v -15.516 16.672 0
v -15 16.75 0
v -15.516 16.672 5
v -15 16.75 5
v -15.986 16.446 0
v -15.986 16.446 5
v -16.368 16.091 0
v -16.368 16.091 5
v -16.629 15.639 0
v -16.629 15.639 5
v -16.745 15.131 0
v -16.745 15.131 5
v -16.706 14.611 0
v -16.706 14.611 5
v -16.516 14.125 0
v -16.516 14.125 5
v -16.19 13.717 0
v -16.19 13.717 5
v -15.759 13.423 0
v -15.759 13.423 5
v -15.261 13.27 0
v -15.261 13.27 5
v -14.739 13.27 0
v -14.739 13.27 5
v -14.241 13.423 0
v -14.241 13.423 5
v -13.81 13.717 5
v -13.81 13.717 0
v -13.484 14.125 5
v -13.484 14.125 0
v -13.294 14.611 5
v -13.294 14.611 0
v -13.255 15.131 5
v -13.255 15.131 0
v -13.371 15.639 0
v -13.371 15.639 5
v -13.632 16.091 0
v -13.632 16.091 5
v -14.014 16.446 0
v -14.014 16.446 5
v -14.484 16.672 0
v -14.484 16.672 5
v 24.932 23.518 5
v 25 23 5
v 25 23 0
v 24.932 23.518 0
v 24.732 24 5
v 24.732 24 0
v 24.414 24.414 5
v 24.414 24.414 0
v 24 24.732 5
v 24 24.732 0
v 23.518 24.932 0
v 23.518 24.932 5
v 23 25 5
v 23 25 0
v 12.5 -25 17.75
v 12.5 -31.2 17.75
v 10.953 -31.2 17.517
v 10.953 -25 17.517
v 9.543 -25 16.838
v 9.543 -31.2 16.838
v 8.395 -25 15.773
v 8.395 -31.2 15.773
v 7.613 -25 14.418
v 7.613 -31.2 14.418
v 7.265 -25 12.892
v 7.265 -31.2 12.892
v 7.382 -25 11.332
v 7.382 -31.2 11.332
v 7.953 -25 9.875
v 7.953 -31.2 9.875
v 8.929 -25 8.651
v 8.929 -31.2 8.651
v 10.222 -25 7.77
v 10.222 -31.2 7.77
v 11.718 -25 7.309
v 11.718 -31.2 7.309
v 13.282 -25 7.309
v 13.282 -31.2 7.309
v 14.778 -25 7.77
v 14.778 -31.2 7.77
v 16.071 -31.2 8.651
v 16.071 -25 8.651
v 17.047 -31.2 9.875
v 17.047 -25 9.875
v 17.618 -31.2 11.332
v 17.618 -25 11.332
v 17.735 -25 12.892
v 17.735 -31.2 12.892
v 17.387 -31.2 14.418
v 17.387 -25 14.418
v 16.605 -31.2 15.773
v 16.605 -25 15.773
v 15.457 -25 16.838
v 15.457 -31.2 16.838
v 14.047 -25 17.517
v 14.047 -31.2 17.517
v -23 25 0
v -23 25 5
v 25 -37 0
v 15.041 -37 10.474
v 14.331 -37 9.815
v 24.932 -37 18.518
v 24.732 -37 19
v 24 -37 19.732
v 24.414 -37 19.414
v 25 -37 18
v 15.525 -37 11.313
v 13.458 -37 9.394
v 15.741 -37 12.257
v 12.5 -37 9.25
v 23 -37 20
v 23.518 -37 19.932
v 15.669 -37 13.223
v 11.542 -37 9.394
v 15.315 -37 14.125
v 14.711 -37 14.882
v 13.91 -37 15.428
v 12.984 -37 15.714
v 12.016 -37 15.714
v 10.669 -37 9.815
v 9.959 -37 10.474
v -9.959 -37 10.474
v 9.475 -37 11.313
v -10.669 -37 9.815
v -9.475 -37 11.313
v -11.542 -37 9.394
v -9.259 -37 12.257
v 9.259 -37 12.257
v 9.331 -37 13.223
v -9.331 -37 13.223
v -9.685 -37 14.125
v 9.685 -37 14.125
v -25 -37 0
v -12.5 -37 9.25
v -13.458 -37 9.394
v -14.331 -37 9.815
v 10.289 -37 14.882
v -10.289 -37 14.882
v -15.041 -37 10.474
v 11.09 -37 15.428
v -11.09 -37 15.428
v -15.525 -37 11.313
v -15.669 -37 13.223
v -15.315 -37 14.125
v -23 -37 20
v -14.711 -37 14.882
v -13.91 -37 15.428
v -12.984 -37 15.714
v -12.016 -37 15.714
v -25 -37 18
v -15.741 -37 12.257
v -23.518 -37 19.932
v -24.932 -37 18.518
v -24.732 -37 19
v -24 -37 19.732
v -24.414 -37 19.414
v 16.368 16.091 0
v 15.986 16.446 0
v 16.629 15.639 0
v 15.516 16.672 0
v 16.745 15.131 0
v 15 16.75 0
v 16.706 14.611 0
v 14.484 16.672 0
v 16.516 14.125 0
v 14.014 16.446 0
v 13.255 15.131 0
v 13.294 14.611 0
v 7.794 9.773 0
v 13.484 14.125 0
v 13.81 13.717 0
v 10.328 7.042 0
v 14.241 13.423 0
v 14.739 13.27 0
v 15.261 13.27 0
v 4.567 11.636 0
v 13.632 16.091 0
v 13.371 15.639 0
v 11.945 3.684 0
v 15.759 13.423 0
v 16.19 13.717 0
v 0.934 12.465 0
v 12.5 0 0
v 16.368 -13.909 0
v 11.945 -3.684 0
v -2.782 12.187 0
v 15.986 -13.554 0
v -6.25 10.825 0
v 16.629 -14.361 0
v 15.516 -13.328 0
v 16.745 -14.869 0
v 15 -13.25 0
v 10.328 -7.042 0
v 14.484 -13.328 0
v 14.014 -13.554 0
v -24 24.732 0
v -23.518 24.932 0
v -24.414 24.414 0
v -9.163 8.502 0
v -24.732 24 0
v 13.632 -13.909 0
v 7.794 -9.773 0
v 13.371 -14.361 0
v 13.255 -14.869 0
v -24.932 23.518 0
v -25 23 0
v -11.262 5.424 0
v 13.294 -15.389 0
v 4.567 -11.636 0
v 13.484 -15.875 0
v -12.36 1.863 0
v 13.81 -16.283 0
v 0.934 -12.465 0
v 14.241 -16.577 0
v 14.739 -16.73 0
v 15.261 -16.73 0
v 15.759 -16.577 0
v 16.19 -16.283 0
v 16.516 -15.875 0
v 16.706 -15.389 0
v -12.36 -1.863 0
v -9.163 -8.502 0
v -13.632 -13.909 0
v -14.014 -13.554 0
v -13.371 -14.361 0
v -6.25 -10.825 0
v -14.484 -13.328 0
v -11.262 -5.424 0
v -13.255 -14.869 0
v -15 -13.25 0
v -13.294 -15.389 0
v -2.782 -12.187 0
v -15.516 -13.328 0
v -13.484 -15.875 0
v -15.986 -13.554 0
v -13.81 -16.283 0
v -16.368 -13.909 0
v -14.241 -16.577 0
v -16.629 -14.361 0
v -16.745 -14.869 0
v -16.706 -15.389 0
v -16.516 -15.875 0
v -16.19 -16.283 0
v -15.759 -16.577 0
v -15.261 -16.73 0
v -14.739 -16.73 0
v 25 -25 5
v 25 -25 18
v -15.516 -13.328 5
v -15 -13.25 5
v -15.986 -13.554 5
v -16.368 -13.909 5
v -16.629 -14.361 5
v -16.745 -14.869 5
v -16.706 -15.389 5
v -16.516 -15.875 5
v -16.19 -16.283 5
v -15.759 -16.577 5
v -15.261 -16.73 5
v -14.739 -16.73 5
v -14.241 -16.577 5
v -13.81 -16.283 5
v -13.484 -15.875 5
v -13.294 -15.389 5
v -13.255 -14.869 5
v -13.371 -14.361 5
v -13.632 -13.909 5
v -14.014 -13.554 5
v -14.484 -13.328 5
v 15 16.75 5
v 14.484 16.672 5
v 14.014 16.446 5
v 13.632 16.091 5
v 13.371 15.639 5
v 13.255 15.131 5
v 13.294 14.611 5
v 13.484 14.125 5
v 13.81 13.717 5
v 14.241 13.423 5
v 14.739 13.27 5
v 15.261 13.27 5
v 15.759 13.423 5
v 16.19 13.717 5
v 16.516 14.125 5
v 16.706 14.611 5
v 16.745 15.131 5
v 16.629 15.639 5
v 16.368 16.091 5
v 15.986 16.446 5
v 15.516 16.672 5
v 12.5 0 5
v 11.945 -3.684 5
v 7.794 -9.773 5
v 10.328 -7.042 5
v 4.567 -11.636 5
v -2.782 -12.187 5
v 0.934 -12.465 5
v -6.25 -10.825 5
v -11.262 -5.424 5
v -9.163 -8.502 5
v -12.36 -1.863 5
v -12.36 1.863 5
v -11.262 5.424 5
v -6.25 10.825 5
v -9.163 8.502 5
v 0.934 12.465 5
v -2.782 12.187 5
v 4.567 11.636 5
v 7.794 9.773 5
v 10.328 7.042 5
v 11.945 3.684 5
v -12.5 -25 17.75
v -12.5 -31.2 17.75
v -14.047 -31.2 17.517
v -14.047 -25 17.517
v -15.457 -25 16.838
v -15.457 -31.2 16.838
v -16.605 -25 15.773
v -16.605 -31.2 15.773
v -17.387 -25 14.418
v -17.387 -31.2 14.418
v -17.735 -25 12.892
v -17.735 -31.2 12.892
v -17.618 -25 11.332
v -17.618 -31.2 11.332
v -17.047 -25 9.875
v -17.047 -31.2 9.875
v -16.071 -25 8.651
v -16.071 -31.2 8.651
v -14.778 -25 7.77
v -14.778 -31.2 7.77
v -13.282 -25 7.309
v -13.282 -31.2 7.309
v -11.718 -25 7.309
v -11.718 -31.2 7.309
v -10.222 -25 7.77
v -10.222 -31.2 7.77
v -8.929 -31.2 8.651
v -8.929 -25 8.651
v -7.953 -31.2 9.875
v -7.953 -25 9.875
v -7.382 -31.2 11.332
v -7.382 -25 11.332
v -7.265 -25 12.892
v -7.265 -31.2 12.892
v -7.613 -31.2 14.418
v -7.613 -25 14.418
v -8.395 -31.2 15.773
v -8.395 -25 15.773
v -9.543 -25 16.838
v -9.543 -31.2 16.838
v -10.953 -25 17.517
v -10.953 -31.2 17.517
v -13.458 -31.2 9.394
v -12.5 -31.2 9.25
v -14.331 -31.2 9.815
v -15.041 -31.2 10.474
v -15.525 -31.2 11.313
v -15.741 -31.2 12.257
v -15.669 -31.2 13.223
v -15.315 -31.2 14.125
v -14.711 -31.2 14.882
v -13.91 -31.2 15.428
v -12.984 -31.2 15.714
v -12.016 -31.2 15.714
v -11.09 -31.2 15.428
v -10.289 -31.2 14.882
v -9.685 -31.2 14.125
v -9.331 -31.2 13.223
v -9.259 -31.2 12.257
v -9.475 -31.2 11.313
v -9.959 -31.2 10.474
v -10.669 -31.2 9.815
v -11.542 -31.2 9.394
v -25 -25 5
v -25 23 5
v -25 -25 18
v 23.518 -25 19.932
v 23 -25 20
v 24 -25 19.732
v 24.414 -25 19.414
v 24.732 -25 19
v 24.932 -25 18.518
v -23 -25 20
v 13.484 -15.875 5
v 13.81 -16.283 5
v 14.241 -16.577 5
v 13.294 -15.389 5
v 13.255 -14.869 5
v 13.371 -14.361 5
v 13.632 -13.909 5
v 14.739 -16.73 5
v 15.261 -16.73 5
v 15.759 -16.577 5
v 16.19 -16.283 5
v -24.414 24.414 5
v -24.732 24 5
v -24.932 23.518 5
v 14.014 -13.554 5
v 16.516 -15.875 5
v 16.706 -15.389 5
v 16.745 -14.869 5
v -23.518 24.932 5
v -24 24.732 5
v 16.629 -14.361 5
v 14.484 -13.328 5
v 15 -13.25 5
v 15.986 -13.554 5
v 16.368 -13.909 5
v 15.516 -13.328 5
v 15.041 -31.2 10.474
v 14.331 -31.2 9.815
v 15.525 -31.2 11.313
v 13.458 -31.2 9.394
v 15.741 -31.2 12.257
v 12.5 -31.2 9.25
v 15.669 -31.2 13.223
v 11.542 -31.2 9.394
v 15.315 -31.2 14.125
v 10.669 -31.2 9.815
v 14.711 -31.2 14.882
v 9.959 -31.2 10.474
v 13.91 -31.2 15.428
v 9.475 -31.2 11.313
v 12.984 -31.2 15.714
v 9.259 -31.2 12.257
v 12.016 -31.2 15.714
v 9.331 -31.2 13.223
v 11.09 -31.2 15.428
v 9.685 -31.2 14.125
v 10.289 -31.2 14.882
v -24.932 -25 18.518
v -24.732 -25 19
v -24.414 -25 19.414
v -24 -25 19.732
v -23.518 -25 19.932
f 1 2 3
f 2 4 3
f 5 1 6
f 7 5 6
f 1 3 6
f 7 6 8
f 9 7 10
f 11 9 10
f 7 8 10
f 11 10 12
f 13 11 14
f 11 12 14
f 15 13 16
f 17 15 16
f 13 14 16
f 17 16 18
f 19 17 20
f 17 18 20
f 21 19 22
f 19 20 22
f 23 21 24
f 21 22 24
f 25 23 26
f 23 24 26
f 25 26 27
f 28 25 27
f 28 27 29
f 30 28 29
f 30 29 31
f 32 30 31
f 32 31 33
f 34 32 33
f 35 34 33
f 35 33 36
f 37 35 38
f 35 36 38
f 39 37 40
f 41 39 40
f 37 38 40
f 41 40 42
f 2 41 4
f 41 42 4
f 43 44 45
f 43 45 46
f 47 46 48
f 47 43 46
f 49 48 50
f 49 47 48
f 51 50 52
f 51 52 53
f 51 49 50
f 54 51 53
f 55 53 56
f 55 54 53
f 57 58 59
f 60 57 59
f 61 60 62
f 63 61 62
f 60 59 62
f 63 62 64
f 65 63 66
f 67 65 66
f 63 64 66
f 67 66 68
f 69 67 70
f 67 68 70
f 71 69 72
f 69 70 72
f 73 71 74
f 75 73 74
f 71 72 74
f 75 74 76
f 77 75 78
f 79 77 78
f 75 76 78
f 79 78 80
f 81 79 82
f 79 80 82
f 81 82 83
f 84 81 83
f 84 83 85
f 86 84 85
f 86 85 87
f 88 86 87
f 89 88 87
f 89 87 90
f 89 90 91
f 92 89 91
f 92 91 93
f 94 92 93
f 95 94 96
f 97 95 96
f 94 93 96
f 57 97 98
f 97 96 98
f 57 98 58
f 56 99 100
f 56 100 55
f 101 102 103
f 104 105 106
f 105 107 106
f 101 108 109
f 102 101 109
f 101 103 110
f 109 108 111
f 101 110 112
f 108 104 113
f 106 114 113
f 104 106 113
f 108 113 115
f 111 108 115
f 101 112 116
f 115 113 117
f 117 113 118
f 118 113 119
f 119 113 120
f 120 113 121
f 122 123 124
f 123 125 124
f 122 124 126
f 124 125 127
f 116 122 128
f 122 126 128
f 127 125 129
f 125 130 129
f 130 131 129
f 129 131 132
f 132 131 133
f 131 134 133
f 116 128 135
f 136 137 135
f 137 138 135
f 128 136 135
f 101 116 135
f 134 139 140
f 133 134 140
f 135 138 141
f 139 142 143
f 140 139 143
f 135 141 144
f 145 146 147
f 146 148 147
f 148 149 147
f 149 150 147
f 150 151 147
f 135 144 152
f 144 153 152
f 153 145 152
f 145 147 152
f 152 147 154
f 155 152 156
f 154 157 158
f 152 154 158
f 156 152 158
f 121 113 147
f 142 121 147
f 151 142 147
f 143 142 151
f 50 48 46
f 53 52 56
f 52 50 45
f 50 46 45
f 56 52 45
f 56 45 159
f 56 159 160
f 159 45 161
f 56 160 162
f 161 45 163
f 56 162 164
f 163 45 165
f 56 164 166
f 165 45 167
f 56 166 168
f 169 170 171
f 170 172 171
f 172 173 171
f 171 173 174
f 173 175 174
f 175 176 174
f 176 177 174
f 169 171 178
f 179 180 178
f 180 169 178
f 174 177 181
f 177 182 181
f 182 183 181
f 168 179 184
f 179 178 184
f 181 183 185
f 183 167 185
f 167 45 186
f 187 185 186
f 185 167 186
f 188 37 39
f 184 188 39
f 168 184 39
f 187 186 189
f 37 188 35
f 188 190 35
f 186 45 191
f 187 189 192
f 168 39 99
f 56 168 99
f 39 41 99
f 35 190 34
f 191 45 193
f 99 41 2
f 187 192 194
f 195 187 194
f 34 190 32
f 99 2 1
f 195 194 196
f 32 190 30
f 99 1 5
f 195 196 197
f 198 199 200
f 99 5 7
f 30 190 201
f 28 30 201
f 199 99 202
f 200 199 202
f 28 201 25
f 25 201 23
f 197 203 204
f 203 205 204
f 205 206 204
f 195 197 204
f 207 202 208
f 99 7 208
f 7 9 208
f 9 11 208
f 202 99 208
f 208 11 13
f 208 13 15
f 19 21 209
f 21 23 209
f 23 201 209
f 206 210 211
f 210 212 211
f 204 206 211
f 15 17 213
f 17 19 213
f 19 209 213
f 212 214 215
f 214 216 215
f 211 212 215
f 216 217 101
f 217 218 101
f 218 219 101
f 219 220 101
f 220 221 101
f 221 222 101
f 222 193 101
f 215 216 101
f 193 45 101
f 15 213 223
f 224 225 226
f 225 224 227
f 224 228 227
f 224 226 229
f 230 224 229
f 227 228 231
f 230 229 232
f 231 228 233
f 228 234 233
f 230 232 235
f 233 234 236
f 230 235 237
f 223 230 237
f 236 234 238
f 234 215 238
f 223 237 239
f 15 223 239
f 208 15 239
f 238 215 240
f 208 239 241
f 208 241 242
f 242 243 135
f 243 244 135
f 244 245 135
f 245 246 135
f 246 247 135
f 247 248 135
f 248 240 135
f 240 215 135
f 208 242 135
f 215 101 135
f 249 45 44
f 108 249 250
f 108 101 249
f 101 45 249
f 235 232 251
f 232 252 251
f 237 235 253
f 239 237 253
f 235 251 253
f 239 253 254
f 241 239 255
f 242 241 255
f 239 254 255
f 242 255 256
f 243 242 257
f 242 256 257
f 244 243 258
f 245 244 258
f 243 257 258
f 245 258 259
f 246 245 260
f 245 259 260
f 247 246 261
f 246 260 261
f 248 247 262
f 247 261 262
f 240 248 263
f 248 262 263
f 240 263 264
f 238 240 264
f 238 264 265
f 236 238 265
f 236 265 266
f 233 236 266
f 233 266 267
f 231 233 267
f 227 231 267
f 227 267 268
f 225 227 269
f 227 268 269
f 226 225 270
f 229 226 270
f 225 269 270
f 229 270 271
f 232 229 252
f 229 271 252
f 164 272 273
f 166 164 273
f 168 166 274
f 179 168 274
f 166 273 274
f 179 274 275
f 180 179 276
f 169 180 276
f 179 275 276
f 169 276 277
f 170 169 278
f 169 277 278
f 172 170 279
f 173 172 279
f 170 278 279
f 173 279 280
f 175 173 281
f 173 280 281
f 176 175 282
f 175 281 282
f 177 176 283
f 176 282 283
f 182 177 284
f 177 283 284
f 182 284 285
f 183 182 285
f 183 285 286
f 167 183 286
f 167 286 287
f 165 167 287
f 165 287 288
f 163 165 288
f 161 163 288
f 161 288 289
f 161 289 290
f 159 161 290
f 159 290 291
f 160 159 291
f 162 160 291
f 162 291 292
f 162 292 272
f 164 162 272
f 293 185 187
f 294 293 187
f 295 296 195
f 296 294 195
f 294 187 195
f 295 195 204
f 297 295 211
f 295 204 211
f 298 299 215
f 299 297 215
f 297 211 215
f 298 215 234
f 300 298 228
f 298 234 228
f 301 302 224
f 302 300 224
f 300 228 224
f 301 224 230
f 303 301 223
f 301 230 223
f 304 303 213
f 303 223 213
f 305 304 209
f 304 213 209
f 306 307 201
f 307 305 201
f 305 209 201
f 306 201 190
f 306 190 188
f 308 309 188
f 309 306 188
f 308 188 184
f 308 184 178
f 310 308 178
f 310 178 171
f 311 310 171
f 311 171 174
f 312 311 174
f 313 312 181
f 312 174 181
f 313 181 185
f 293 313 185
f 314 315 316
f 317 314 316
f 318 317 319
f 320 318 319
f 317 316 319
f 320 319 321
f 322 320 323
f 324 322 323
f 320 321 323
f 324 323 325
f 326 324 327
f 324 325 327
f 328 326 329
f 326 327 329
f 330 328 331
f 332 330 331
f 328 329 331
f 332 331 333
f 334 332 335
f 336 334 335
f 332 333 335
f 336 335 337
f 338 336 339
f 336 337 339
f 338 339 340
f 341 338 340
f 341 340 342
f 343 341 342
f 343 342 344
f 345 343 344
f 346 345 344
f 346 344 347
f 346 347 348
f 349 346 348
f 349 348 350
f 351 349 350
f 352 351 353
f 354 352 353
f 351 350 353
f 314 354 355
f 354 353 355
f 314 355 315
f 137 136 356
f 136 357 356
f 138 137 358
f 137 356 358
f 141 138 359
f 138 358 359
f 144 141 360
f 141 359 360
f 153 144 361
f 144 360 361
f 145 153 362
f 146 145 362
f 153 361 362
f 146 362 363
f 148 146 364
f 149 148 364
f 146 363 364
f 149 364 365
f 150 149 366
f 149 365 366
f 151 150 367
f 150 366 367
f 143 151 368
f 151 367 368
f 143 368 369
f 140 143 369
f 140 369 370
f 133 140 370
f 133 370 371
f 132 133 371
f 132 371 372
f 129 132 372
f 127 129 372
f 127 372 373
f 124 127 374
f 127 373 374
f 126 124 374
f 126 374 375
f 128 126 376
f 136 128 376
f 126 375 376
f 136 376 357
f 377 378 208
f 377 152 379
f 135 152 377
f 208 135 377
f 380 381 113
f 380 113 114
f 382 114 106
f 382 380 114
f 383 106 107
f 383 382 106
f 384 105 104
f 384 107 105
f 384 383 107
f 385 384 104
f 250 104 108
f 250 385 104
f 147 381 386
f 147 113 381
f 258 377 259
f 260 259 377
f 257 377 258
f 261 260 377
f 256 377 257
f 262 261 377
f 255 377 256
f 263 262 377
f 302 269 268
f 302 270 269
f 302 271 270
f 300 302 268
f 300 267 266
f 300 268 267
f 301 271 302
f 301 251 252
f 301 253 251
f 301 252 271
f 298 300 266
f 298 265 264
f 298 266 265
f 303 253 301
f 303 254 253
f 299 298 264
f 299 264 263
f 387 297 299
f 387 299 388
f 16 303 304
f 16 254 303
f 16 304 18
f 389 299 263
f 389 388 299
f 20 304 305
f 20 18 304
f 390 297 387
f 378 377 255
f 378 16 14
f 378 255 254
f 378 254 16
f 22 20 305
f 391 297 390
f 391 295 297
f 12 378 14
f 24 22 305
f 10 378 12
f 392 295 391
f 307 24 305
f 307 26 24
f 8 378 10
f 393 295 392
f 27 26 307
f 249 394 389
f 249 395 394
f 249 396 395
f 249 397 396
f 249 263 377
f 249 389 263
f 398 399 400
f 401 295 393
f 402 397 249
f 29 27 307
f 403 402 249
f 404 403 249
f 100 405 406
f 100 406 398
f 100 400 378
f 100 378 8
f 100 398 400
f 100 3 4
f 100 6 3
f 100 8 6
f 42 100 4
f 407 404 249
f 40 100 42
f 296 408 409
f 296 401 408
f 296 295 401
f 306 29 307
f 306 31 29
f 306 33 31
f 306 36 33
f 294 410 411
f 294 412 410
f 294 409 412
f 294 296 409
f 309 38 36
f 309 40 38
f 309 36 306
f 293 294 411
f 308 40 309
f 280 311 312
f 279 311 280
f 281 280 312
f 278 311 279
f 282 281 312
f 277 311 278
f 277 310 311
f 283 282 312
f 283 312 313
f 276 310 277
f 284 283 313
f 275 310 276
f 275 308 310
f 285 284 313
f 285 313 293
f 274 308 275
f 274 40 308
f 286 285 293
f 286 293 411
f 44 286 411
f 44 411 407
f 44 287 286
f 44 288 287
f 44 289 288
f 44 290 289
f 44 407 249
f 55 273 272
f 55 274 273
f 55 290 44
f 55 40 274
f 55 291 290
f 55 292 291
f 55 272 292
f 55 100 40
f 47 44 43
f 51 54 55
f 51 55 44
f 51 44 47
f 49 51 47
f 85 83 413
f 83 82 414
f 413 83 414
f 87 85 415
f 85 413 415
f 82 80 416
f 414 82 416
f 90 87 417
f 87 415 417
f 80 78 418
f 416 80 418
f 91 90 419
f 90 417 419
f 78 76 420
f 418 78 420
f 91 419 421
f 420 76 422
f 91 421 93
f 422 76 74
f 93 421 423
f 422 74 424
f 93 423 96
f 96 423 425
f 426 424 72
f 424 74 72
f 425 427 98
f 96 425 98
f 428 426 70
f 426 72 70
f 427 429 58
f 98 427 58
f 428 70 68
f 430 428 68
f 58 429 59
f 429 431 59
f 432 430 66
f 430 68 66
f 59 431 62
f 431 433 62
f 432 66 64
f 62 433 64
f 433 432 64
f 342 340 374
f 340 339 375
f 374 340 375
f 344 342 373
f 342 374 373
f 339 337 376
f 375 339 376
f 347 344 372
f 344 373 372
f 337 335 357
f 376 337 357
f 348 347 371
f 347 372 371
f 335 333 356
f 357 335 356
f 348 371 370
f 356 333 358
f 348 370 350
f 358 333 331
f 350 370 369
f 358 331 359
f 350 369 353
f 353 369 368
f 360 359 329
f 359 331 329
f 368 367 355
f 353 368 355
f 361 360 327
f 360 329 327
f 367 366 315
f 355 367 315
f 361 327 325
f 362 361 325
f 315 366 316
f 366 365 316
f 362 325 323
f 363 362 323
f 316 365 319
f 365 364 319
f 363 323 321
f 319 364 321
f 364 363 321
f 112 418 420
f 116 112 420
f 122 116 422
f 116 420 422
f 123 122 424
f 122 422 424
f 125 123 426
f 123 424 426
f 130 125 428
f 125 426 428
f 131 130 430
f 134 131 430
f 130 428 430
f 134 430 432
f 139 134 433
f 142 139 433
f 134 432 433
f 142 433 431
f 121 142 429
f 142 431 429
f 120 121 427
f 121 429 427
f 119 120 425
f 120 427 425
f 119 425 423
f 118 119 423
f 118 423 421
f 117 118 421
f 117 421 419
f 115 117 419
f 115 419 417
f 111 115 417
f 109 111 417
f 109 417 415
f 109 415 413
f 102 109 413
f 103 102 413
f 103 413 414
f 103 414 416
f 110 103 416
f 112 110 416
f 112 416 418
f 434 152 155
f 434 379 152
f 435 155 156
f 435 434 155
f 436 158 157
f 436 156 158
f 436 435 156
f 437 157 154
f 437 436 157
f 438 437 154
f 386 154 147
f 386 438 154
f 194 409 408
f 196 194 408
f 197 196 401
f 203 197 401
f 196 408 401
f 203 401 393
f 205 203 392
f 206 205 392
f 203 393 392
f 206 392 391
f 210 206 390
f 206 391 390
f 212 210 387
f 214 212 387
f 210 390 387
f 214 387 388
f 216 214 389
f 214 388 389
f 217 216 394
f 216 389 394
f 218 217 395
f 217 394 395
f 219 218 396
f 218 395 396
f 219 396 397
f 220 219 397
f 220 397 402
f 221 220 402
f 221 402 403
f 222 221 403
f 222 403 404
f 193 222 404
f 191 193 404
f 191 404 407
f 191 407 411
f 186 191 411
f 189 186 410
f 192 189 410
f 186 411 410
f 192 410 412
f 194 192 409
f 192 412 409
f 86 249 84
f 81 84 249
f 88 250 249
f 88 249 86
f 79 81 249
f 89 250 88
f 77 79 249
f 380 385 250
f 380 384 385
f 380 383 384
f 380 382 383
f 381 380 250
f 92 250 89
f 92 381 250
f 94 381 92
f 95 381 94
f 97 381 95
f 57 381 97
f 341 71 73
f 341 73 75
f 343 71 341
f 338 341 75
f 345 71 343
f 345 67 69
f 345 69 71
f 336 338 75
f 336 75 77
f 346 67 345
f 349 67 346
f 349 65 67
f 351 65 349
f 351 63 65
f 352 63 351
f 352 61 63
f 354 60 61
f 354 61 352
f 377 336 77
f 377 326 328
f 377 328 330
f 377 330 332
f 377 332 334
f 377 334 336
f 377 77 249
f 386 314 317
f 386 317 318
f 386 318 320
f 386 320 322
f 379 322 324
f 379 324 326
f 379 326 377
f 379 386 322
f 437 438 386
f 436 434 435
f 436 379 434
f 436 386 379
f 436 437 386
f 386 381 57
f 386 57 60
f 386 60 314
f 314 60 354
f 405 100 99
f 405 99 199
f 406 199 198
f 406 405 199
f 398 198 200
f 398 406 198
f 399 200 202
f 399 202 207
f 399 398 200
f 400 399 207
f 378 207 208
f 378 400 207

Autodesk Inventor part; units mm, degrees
ref_plane "YZ Plane" through (0, 0, 0) normal (1, 0, 0) x (0, 1, 0)
ref_plane "XY Plane" through (0, 0, 0) normal (0, 0, 1) x (1, 0, 0)
sketch "Sketch1" plane through (0, 0, 0) normal (0, 0, 1) x (1, 0, 0)
  circle A0 centre (0, 0) radius 12.5
  line L0 (25, -25) -> (-25, -25)
  line L1 (-25, -25) -> (-25, 25)
  line L2 (-25, 25) -> (25, 25)
  line L3 (25, 25) -> (25, -25)
  line L4 (25, -25) -> (-25, 25) construction
  line L5 (-25, -25) -> (25, 25) construction
  point P0 (-15, 15)
  point P1 (15, 15)
  point P2 (-15, -15)
  point P3 (15, -15)
  dimension "d0" = 25
  dimension "d1" = 50
  dimension "d2" = 50
  dimension "d5" = 30
  dimension "d8" = 30
extrude "Extrusion1" add sketch "Sketch1" along normal blind 5
hole "Hole1" at (-15, 15, 0) at (15, 15, 0) at (-15, -15, 0) at (15, -15, 0) direction (0, 0, 1) diameter 3.5 end through all
ref_plane "Work Plane1" through (0, -37, 0) normal (0, 1, 0) x (-1, 0, 0)
sketch "Sketch2" plane through (0, -37, 0) normal (0, 1, 0) x (-1, 0, 0)
  line L0 (-25, 0) -> (25, 0) projected
  line L1 (-25, 0) -> (-25, 5) projected
  line L2 (25, 0) -> (-25, 0)
  line L3 (-25, 0) -> (-25, 20)
  line L4 (-25, 20) -> (25, 20)
  line L5 (25, 20) -> (25, 0)
  point P0 (0, 0)
  point P1 (12.5, 12.5)
  point P2 (-12.5, 12.5)
  dimension "d21" = 20
  dimension "d24" = 25
  dimension "d46" = 12.5
extrude "Extrusion2" add sketch "Sketch2" along normal up to surface (12 mm away)
hole "Hole2" at (12.5, -37, 12.5) at (-12.5, -37, 12.5) direction (0, 1, 0) diameter 6.5 end through all
fillet "Fillet1" radius 2 4 edges at (25, 25, 2.5) (-25, 25, 2.5) (25, -31, 20) (-25, -31, 20)
sketch "Sketch5" plane through (-25, -25, 5) normal (0, 1, 0) x (1, 0, 0)
  point P0 (25, 5)
  point P1 (12.5, -7.5)
  point P2 (37.5, -7.5)
hole "Hole4" at (-12.5, -25, 12.5) at (12.5, -25, 12.5) direction (0, -1, 0) diameter 10.5 depth 6.2
properties part number "mirror-bracket"
